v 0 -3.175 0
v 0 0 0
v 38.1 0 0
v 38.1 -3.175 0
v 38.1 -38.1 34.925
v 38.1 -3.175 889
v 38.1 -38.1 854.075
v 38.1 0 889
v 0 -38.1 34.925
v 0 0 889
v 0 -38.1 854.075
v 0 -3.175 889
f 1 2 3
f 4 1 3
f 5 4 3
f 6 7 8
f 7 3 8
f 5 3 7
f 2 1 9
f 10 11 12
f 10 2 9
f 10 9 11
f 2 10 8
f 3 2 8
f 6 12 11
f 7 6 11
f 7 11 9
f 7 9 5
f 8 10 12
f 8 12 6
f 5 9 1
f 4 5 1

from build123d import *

# Parameters (mm, degrees)
F0_W     = 38.1
F0_H     = 889
F1_DEPTH = 38.1
F3_DEPTH = 38.101


with BuildPart() as f1:
    # F0 (on Front) → F1 (new body)
    with BuildSketch(Plane.XZ):
        with Locations((19.05, 444.5)):
            Rectangle(F0_W, F0_H)
    extrude(amount=F1_DEPTH)

    # F2 (on face) → F3 (cut, through all)
    with BuildSketch(Plane(origin=(0, 0, 0), x_dir=(0, -1, 0), z_dir=(-1, 0, 0))):
        Polygon((38.1, 889), (3.175, 889), (38.1, 854.075), align=None)
        Polygon((38.1, 34.925), (3.175, 0), (38.1, 0), align=None)
    extrude(amount=-F3_DEPTH, mode=Mode.SUBTRACT)


solid = f1.part
